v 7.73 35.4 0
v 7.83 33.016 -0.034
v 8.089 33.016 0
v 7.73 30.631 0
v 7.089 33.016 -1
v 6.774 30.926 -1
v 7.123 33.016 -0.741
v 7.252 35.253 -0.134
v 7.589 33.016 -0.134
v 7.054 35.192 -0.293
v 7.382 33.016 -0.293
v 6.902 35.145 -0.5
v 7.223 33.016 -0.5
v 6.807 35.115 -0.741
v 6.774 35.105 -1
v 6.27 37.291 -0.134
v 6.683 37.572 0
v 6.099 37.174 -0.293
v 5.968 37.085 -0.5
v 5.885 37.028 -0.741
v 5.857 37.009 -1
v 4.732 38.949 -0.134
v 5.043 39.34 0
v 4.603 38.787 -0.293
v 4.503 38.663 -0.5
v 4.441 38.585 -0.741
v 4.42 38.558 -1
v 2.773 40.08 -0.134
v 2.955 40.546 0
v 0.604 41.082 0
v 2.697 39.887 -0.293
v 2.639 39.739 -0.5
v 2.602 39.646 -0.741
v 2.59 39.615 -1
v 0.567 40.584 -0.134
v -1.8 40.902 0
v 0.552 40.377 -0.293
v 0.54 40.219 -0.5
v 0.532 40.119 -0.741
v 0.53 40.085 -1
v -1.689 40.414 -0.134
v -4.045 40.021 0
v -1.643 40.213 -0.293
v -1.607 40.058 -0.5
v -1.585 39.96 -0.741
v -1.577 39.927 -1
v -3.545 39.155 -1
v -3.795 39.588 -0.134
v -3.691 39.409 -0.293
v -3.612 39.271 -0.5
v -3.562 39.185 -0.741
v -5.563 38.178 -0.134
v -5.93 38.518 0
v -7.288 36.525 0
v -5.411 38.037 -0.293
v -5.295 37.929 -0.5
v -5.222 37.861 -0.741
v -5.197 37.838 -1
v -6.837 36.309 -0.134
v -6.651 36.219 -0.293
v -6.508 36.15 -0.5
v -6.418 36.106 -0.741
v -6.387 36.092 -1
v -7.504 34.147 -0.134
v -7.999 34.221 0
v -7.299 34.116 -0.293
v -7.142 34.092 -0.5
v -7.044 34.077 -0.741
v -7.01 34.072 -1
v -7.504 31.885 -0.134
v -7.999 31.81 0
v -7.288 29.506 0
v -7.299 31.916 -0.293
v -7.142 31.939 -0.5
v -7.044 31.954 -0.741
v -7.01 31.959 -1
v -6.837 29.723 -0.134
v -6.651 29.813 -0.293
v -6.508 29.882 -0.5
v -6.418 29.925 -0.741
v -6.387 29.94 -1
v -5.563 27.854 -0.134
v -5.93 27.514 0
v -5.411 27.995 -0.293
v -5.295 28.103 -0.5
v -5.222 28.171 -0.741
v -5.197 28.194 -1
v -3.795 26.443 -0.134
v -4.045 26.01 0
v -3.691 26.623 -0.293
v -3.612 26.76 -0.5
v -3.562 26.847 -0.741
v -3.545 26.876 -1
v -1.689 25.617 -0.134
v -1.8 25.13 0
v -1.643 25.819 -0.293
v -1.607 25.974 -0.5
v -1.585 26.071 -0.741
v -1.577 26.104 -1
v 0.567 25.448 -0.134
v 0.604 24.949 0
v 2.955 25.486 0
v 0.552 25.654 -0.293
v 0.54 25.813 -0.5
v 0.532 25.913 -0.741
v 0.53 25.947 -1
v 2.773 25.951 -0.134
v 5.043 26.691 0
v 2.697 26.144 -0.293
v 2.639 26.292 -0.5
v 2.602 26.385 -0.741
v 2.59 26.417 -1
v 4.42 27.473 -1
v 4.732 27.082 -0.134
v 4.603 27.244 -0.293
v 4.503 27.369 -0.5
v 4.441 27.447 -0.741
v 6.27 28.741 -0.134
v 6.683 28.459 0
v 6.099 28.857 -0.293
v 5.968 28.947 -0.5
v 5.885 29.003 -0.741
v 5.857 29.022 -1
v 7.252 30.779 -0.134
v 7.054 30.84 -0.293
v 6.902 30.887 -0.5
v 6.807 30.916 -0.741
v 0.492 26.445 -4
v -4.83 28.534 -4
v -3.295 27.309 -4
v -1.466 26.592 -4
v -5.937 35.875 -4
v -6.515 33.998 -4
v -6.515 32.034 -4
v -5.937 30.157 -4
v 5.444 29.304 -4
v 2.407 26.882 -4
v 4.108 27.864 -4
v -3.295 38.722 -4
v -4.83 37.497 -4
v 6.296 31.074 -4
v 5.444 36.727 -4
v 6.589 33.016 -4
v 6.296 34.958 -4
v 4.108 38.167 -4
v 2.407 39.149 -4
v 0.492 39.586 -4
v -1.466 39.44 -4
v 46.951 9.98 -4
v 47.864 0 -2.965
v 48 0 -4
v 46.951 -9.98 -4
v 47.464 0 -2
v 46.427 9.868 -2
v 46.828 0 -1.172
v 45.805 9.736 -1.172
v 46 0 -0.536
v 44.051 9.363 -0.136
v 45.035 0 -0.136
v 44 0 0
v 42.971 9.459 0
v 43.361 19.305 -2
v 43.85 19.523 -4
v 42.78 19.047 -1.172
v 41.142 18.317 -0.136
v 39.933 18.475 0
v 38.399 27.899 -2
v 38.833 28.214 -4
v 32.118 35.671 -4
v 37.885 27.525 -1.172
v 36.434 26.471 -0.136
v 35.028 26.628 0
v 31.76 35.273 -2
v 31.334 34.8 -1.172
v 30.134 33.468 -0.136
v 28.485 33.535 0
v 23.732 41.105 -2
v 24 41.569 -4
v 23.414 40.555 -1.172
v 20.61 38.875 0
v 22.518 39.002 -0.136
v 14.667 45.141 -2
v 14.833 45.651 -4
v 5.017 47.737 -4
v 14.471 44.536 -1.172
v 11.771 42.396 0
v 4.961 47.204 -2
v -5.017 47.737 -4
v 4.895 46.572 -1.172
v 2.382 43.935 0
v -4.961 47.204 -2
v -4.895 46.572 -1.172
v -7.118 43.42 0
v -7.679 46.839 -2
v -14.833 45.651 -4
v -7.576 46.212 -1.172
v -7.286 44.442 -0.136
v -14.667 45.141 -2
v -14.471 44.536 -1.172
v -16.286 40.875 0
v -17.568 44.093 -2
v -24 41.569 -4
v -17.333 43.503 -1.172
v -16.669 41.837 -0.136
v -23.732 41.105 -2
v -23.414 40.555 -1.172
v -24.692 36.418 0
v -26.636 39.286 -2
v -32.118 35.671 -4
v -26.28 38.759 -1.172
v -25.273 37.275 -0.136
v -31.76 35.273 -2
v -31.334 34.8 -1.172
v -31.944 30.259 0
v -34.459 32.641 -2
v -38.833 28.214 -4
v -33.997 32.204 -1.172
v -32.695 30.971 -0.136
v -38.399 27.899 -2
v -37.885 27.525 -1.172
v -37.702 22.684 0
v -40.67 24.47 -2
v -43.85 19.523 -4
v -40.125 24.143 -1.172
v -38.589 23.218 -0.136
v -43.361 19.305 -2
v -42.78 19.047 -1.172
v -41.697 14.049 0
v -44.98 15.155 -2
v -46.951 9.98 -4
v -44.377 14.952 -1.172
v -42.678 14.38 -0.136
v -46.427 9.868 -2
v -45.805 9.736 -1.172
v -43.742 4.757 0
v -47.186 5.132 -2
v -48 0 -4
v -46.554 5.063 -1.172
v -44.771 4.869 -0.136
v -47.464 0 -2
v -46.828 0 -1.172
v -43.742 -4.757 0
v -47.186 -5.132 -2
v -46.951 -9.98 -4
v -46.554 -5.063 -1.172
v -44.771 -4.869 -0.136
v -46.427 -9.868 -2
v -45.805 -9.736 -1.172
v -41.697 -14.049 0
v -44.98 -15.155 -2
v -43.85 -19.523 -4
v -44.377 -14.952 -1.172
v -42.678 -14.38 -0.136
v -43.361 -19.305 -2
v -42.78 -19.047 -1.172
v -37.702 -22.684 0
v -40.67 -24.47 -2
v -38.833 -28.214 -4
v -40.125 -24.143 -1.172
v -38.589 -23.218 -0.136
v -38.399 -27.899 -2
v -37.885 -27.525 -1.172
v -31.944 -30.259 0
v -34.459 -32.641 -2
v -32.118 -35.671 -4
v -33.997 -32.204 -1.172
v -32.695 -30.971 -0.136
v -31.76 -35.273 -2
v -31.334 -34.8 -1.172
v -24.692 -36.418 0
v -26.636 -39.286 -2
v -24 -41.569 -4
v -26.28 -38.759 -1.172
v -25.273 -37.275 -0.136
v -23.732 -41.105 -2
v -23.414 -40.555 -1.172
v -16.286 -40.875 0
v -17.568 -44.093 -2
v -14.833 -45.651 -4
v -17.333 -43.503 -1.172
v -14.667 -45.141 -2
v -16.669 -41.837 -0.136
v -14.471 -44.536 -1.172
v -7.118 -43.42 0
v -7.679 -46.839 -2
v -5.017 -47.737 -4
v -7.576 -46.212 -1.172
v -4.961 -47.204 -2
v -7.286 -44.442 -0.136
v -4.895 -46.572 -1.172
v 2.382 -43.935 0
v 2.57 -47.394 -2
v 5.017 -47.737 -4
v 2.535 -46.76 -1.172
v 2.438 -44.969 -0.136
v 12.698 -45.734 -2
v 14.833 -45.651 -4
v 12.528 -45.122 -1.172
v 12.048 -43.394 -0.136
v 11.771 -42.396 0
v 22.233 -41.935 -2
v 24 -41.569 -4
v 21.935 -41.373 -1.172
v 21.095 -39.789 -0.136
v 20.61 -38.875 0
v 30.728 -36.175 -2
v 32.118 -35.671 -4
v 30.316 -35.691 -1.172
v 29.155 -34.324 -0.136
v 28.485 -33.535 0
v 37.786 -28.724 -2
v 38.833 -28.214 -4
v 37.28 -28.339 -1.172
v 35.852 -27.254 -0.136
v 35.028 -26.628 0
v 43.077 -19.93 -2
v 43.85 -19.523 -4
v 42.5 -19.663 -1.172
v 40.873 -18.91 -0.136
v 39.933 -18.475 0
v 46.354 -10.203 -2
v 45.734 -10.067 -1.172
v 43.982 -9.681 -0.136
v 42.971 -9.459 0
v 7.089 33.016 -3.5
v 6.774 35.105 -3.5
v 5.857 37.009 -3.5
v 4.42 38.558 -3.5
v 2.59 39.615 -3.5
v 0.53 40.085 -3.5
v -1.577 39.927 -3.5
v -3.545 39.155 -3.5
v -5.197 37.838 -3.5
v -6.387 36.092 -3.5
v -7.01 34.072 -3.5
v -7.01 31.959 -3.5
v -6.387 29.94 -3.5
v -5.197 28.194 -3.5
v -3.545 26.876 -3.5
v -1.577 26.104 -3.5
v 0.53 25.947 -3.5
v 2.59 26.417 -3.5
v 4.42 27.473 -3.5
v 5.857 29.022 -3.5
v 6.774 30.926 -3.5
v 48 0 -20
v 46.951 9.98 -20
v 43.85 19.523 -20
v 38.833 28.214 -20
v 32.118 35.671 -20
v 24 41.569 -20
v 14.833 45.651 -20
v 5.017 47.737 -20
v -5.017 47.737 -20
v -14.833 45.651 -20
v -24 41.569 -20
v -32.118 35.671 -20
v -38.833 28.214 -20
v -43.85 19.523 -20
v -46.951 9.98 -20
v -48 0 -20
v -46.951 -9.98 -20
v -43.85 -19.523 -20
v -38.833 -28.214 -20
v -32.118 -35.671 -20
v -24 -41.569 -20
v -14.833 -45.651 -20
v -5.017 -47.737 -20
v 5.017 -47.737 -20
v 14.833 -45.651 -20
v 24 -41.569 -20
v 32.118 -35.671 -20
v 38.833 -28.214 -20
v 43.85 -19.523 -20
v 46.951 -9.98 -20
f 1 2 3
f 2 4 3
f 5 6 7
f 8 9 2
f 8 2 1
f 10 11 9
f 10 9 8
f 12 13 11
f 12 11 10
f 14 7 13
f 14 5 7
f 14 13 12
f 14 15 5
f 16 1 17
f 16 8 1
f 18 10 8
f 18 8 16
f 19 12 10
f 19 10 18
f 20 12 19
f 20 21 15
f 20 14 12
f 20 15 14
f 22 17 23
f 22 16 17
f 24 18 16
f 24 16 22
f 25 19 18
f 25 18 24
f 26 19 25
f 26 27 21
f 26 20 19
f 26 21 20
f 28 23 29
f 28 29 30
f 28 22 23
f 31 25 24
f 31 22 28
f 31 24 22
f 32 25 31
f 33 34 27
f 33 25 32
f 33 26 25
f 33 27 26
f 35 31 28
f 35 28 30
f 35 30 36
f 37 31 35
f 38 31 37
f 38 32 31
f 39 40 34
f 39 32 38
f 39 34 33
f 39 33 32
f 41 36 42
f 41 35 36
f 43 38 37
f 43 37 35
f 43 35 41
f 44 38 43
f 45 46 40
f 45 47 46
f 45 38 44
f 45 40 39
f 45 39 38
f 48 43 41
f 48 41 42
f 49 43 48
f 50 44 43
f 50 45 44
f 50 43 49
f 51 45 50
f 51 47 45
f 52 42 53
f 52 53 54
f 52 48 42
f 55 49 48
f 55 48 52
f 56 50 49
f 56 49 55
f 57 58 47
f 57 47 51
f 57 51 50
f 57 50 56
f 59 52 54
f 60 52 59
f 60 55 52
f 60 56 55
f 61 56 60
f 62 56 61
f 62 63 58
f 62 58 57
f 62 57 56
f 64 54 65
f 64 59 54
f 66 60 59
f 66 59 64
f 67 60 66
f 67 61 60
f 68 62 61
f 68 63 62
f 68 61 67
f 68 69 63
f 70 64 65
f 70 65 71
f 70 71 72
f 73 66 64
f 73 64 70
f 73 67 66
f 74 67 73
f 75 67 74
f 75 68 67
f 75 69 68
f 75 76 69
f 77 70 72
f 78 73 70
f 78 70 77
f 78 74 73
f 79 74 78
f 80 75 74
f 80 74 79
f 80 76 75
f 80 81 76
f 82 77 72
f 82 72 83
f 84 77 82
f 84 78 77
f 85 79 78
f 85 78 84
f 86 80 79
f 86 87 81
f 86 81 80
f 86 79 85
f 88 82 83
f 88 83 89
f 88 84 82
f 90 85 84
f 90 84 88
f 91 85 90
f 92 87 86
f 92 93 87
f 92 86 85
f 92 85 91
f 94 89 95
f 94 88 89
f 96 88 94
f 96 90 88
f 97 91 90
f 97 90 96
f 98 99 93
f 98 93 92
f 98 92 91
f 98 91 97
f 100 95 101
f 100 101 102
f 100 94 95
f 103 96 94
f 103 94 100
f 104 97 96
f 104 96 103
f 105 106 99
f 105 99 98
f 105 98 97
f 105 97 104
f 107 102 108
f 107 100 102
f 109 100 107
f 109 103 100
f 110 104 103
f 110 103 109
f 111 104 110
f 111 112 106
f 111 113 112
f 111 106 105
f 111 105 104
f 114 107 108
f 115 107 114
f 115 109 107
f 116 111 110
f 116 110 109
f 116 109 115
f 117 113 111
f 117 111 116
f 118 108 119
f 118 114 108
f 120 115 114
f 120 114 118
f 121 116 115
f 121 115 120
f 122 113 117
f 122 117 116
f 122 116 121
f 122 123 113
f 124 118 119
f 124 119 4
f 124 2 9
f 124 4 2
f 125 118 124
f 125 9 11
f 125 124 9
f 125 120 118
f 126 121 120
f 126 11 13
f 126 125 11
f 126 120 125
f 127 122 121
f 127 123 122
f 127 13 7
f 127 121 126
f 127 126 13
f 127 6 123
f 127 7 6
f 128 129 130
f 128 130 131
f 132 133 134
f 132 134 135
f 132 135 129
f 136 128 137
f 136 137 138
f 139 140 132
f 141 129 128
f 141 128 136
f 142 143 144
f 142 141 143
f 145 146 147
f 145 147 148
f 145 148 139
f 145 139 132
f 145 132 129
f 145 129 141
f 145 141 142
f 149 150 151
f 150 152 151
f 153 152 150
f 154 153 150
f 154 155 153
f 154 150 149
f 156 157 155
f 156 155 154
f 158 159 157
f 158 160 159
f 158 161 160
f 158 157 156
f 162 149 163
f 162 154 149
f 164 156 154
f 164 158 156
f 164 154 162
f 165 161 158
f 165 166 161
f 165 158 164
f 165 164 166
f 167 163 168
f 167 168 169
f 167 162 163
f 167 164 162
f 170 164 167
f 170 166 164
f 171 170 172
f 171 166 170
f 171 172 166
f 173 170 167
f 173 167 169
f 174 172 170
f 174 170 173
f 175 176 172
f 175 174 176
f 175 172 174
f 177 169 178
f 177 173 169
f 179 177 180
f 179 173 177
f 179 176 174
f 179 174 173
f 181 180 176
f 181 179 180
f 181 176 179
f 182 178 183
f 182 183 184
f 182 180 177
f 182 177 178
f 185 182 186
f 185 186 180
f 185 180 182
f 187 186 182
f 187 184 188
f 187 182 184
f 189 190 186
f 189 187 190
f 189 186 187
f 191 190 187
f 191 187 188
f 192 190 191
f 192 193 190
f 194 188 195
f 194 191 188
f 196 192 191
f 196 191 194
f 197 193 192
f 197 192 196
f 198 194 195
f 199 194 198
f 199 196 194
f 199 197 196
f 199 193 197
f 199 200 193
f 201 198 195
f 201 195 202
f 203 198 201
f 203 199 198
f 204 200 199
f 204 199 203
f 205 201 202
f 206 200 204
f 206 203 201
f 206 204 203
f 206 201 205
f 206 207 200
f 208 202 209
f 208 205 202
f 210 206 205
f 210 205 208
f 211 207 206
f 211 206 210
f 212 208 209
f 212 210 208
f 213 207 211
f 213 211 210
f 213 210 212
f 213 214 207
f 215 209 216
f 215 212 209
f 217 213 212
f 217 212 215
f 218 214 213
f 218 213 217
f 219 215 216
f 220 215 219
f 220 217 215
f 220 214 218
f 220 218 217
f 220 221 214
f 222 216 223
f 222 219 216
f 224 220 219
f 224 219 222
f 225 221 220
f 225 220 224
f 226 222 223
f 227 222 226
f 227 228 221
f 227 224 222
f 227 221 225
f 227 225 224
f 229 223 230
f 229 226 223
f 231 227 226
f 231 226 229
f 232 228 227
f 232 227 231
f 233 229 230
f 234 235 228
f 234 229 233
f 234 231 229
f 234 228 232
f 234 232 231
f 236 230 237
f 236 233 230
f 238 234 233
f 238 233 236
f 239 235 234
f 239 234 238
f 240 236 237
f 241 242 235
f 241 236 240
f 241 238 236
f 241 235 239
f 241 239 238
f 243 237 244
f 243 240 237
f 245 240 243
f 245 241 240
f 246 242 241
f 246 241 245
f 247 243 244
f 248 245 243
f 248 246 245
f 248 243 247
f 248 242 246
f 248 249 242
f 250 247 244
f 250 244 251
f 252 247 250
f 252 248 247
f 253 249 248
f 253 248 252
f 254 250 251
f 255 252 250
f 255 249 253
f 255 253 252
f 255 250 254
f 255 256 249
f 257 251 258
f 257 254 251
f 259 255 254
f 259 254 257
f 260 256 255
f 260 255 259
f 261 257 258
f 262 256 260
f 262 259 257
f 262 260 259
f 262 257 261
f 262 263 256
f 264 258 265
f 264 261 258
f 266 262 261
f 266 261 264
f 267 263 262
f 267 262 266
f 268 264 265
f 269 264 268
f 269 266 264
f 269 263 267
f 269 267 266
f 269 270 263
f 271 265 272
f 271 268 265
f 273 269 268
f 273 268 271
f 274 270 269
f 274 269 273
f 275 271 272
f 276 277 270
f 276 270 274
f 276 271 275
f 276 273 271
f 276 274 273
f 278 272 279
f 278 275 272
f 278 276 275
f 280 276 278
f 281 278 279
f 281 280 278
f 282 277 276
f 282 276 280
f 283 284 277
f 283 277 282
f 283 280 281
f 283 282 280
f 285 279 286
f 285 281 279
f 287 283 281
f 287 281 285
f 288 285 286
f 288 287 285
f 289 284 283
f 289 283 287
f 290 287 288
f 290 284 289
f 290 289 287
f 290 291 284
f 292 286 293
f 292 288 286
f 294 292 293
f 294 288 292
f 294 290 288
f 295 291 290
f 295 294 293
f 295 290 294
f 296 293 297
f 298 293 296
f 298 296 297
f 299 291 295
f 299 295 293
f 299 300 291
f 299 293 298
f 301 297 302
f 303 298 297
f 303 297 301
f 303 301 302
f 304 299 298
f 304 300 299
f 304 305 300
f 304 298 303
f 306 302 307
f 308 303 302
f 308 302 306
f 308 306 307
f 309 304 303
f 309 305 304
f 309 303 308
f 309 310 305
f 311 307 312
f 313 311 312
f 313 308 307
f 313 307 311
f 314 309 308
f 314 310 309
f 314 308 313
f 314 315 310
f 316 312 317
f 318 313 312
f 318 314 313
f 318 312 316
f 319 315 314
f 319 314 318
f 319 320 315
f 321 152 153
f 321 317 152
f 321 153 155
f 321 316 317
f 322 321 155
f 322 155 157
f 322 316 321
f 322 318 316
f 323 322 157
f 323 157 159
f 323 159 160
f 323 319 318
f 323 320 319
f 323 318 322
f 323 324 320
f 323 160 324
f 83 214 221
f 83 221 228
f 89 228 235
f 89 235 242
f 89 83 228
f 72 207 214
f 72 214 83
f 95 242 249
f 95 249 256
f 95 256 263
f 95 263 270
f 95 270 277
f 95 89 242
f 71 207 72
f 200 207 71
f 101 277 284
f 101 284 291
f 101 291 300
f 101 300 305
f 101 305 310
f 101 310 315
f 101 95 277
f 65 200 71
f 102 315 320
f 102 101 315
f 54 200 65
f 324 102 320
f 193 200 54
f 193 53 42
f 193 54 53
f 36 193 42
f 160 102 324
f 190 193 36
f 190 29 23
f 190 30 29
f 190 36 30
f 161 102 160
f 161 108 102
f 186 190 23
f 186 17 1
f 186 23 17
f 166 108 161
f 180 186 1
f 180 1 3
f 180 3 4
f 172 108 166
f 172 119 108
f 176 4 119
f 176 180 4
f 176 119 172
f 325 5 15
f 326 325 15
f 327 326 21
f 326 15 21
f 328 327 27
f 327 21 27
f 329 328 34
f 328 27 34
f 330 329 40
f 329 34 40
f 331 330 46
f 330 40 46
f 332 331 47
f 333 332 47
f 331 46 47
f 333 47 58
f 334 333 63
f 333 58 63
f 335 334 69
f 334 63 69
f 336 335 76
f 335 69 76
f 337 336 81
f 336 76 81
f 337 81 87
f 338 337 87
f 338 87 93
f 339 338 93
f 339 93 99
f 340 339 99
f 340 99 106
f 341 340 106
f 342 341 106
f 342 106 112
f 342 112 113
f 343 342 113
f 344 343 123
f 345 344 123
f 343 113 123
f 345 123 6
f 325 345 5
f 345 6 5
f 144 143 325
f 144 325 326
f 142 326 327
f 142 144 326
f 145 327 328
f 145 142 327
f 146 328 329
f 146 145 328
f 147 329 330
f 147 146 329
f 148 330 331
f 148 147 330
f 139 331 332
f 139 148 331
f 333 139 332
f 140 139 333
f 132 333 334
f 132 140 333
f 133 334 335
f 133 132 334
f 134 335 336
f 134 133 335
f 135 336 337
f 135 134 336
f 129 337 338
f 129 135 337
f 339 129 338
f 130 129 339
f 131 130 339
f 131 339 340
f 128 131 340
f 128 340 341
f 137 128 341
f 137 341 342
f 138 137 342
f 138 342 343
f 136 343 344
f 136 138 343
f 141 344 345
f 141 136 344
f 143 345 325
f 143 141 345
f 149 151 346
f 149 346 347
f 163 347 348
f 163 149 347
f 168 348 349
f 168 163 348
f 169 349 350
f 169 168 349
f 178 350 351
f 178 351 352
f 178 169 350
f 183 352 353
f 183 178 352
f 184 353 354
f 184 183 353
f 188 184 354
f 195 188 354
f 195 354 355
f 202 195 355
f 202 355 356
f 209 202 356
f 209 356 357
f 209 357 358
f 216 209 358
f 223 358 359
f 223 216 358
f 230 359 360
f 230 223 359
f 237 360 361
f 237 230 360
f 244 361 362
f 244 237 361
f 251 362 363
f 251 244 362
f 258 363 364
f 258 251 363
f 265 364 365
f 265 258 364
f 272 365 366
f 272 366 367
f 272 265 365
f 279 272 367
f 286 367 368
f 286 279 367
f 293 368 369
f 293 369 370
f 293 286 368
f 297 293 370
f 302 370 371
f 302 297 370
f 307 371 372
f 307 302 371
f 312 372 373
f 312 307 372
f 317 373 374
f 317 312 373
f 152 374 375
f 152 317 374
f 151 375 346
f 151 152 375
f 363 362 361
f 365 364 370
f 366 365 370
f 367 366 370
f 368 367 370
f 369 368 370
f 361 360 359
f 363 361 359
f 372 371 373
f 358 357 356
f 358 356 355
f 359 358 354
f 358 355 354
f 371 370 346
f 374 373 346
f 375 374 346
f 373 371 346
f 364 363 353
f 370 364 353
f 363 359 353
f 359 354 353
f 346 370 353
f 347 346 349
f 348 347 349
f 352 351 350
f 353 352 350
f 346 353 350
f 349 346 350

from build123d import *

# Parameters (mm, degrees)
SKETCH1_R           = 48
BOSS_EXTRUDE1_DEPTH = 20
FILLET1_R           = 4
SKETCH2_R           = 7.089026355
CUT_EXTRUDE1_DEPTH  = 4
FILLET3_R           = 1
CHAMFER1_SIZE       = 0.5


with BuildPart() as part:
    # Sketch1 → Boss-Extrude1 (new body)
    with BuildSketch(Plane.XY):
        Circle(SKETCH1_R)
    extrude(amount=-BOSS_EXTRUDE1_DEPTH)

    # Fillet1
    fillet1_edges = [part.edges().sort_by_distance(p)[0] for p in [
        (-48, 0, 0),
    ]]
    fillet(fillet1_edges, radius=FILLET1_R)

    # Sketch2 → Cut-Extrude1 (cut)
    with BuildSketch(Plane.XY):
        with Locations((0, 33.015746337)):
            Circle(SKETCH2_R)
    extrude(amount=-CUT_EXTRUDE1_DEPTH, mode=Mode.SUBTRACT)

    # Fillet3
    fillet3_edges = [part.edges().sort_by_distance(p)[0] for p in [
        (-7.089026355, 33.015746337, 0),
    ]]
    fillet(fillet3_edges, radius=FILLET3_R)

    # Chamfer1
    chamfer1_edges = [part.edges().sort_by_distance(p)[0] for p in [
        (-7.089026355, 33.015746337, -4),
    ]]
    chamfer(chamfer1_edges, length=CHAMFER1_SIZE)


solid = part.part
